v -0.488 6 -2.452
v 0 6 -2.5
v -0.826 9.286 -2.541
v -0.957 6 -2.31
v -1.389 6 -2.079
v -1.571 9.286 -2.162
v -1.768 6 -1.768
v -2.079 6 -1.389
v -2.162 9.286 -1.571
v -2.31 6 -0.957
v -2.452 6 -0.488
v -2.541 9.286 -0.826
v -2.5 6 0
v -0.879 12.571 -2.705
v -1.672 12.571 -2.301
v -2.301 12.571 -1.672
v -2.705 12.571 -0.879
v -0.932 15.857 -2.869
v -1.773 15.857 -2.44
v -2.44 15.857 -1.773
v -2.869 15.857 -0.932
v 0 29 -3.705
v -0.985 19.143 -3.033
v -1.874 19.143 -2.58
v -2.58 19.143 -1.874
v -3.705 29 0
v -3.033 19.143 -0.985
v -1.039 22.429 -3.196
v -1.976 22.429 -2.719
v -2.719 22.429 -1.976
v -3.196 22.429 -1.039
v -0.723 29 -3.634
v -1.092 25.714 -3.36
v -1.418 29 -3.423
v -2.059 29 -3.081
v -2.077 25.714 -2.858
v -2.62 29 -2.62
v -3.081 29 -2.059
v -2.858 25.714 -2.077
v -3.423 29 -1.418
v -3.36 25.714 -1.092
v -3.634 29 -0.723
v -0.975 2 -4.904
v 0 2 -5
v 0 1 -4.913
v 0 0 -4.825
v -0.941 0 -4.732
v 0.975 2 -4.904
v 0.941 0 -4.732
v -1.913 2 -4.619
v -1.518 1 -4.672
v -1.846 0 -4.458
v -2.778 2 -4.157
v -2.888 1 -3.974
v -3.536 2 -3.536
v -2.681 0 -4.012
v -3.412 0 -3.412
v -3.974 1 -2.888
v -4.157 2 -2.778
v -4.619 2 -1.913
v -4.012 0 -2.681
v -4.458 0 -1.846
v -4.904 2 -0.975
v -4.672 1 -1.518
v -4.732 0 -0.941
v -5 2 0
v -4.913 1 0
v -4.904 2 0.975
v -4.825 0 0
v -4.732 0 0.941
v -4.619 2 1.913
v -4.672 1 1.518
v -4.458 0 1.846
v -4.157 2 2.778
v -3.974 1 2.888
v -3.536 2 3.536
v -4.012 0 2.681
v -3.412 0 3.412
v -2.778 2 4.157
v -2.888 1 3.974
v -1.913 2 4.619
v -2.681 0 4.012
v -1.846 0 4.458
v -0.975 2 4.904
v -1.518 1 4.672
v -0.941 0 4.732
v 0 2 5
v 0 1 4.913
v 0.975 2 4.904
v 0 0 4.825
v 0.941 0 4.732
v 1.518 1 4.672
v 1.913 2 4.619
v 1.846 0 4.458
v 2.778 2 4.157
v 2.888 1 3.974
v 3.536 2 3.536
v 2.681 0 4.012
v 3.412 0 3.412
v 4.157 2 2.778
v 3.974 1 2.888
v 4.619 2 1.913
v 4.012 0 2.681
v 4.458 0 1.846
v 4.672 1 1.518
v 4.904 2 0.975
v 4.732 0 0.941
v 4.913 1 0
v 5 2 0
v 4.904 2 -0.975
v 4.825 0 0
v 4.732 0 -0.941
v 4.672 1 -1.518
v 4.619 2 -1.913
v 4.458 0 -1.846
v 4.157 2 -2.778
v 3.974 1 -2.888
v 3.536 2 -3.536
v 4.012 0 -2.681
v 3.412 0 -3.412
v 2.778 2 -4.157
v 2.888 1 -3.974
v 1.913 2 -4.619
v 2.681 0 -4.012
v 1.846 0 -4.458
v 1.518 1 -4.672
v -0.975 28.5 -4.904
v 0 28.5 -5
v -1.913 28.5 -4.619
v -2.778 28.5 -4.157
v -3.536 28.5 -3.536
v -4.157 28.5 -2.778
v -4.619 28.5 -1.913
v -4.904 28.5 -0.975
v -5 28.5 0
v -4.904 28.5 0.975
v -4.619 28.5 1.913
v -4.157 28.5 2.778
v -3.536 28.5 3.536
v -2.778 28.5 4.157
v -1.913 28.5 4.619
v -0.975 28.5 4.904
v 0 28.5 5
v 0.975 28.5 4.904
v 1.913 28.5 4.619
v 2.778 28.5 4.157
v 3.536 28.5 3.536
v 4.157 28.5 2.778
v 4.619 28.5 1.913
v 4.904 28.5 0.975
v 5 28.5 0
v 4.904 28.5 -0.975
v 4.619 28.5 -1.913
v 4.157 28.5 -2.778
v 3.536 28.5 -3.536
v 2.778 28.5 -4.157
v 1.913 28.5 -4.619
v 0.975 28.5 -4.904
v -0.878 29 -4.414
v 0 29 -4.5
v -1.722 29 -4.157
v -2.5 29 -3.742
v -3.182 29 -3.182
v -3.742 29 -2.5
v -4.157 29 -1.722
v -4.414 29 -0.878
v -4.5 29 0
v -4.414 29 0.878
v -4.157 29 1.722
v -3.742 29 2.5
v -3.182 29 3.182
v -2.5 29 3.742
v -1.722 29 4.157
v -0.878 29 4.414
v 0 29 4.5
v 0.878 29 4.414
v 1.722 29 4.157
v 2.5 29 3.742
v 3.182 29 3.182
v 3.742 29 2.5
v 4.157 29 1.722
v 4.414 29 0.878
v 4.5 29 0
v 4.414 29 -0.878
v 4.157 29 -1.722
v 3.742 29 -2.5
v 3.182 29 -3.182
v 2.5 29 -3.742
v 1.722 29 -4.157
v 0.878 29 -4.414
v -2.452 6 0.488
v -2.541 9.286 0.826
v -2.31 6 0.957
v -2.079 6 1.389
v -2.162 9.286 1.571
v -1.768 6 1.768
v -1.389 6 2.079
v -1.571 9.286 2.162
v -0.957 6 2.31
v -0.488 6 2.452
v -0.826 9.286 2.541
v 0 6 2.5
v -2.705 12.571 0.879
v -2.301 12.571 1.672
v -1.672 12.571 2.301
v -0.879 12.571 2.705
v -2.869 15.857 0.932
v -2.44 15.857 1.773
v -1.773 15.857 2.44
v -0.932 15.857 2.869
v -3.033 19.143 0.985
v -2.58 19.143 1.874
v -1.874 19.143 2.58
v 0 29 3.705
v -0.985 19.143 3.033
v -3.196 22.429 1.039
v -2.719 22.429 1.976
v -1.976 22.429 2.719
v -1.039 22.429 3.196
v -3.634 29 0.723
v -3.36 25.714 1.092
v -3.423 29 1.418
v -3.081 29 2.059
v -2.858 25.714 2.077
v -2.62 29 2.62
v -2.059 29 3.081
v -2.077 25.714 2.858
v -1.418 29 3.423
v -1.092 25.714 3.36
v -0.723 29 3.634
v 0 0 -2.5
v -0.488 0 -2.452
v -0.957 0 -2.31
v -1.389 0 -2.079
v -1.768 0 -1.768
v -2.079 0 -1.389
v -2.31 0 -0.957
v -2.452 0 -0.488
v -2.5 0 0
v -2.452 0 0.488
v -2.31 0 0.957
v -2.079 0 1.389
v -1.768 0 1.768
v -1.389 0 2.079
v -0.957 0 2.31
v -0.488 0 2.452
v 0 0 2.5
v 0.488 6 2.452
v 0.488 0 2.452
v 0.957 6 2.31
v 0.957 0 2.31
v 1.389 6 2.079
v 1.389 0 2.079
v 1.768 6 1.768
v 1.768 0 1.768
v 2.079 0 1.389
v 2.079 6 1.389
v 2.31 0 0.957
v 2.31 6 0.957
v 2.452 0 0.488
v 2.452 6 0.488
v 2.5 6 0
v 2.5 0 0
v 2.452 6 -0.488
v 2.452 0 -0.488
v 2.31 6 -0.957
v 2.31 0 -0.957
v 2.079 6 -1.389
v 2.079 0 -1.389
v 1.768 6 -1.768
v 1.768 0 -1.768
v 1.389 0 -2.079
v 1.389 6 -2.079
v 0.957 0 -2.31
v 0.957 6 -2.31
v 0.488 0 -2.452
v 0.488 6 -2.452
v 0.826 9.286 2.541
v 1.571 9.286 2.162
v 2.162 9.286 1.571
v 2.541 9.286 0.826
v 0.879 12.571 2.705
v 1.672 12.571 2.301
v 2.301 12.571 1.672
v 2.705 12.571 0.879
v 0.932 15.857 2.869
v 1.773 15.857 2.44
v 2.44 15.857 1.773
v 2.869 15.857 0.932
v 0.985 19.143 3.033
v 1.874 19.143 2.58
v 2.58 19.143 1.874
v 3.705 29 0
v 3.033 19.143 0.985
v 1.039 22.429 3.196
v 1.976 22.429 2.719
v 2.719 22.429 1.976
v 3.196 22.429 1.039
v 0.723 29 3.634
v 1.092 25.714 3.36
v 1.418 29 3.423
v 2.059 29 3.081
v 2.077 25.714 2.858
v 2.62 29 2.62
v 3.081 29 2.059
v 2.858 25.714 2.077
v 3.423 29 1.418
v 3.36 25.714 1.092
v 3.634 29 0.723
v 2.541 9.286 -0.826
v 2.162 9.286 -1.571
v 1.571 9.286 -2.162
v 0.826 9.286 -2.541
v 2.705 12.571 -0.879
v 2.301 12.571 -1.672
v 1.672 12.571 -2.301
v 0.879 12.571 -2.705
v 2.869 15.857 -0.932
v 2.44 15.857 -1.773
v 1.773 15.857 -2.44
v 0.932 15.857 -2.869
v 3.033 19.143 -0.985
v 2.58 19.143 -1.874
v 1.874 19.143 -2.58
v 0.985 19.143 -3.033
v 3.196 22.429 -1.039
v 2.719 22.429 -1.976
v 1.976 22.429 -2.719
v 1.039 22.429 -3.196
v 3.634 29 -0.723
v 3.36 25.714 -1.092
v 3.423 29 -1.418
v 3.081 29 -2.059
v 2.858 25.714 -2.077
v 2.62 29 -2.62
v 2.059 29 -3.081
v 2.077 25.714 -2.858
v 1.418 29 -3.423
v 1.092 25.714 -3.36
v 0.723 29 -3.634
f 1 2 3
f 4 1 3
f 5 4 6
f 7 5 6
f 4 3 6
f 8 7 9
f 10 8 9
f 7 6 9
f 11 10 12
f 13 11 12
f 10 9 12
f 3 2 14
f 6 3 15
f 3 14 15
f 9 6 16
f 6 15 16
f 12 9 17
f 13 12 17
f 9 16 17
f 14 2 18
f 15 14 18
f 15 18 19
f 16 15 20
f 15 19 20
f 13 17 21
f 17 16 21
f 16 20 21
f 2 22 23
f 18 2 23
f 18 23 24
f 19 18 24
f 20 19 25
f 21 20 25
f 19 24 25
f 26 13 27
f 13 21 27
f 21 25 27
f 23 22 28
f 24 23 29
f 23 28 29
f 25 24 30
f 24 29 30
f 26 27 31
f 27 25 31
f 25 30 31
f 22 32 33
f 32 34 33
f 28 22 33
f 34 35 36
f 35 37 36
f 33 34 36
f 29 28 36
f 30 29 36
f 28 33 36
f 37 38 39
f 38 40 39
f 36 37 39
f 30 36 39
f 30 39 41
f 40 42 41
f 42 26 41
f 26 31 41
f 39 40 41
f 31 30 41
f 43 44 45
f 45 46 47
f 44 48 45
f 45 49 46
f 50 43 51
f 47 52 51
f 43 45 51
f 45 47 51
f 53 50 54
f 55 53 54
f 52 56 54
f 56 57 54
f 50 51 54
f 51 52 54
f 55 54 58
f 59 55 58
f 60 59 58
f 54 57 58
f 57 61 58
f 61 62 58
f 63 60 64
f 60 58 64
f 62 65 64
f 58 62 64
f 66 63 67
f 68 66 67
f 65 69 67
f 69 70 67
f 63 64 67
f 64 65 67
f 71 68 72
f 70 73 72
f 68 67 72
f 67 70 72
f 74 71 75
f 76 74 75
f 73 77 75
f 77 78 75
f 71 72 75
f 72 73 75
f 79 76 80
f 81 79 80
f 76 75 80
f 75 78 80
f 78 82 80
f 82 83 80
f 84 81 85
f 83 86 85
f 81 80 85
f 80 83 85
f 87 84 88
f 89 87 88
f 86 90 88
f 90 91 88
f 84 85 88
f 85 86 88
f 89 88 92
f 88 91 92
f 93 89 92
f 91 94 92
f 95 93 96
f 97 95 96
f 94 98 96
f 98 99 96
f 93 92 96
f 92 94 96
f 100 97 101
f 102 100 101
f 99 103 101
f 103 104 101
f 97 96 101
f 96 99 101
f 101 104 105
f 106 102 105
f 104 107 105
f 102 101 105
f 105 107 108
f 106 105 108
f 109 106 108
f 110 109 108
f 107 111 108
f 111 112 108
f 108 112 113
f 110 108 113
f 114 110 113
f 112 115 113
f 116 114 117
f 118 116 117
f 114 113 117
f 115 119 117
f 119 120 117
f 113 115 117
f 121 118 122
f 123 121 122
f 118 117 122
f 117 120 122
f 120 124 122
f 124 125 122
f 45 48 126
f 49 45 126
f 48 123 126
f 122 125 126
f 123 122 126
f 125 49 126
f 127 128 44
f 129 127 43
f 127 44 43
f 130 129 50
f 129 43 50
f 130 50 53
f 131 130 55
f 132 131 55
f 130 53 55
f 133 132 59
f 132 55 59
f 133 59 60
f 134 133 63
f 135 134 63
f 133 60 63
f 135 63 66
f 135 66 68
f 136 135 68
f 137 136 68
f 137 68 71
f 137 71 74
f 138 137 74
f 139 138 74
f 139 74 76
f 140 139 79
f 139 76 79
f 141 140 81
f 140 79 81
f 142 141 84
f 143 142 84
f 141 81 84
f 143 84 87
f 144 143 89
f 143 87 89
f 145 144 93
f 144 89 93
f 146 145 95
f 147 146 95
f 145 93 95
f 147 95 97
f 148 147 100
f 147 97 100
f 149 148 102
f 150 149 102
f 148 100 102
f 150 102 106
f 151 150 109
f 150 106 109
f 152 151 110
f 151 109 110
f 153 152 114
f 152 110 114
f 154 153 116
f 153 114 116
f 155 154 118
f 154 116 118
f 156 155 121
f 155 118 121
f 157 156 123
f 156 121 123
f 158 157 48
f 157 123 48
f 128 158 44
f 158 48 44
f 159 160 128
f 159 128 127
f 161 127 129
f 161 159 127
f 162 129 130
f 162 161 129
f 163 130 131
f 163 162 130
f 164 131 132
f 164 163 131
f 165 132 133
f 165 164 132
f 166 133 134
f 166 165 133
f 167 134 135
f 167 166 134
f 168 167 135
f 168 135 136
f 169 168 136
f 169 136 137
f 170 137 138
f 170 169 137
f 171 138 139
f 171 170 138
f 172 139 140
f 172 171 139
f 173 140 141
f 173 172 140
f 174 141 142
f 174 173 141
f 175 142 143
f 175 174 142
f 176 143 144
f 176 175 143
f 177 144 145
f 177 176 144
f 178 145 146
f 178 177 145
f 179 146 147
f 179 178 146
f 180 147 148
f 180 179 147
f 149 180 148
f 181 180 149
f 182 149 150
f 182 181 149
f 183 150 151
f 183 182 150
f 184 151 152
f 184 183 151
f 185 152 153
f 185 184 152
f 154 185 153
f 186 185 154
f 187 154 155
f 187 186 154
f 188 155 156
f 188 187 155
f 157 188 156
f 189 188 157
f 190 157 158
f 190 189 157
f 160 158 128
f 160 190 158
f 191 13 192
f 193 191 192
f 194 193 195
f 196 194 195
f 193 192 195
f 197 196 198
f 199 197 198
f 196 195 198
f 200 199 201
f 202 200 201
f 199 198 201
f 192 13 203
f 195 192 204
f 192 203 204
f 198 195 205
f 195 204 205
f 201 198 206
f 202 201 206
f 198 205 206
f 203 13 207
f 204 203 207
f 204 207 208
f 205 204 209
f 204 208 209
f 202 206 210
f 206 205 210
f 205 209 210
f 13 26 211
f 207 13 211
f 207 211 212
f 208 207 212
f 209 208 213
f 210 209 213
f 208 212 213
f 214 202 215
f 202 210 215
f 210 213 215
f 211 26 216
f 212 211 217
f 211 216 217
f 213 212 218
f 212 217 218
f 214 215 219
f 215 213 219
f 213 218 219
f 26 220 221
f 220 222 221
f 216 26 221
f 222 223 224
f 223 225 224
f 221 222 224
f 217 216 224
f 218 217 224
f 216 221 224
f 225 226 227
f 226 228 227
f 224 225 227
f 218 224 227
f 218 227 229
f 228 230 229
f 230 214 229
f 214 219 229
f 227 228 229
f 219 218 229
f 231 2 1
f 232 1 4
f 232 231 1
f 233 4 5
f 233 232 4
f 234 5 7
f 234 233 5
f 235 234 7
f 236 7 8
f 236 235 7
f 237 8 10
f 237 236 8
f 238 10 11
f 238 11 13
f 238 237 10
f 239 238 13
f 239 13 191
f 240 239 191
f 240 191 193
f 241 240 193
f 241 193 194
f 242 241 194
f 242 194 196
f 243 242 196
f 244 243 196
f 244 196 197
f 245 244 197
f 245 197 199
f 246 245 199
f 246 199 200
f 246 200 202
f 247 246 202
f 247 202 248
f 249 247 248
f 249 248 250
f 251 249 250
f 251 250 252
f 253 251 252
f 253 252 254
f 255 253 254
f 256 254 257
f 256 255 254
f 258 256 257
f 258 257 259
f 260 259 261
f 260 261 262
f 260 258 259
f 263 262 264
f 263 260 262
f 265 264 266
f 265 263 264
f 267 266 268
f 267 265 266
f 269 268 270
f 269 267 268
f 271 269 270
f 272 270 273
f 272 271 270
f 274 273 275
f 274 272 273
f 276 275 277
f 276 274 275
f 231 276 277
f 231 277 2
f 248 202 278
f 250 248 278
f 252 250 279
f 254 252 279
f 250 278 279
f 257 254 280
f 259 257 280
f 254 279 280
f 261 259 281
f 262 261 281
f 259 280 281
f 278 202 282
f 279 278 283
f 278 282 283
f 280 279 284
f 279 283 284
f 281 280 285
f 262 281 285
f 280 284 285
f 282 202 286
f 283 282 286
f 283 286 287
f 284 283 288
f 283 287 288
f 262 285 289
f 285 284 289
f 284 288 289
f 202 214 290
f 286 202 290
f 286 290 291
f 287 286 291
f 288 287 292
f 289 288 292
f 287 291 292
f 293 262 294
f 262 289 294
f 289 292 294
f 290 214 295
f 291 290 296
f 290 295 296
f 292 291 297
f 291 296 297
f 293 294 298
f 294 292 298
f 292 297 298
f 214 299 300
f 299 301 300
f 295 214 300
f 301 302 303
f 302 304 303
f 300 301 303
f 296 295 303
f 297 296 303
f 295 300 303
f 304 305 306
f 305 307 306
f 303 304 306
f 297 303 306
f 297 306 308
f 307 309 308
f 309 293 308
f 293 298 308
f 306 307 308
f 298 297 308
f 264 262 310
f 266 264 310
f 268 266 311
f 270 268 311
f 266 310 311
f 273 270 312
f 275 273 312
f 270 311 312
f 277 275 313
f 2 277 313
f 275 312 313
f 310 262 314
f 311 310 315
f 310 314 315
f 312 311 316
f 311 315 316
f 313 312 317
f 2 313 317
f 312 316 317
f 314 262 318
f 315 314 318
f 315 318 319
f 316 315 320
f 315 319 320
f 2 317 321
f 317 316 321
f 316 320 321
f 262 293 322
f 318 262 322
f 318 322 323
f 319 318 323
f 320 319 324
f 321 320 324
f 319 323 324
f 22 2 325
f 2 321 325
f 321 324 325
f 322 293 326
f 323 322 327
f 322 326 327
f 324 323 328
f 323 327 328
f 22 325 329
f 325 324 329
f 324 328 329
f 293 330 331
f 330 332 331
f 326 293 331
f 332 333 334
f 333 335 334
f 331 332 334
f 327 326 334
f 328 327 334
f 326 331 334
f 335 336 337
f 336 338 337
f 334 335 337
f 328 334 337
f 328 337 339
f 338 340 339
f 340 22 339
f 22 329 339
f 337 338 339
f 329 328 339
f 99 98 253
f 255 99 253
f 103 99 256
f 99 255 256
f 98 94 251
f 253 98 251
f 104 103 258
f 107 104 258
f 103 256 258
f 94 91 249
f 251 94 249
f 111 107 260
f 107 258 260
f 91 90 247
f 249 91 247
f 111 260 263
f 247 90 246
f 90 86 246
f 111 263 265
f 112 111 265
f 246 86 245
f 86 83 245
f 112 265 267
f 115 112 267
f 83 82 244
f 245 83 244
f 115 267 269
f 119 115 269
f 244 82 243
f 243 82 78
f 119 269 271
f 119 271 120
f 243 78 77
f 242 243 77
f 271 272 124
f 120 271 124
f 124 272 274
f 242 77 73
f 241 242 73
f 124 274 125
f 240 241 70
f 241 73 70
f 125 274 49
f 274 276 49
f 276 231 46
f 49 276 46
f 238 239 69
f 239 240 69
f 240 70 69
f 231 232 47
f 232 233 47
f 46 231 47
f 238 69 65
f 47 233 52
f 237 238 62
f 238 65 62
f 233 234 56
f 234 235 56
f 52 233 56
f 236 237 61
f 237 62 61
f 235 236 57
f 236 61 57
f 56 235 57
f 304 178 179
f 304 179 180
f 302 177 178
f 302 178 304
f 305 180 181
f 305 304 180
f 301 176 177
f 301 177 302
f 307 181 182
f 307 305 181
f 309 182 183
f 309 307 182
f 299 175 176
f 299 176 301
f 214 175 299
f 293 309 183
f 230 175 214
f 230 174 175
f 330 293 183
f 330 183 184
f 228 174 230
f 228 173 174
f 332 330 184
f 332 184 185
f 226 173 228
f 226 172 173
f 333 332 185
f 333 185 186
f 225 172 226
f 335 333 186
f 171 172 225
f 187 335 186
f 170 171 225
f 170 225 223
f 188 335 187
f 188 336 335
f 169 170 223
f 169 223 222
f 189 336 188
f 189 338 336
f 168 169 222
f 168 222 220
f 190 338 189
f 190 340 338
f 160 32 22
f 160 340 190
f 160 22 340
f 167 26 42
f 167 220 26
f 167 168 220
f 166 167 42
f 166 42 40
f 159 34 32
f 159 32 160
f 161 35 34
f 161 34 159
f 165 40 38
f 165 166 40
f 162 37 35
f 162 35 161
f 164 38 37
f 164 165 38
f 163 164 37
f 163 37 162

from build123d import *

# Parameters (mm, degrees)
SKETCH1_R           = 5
SKETCH1_R_2         = 2.5
BOSS_EXTRUDE1_DEPTH = 29
CHAMFER1_SIZE       = 2
CHAMFER1_SIZE2      = 0.174977327
CHAMFER2_SIZE       = 0.5


with BuildPart() as part:
    # Sketch1 → Boss-Extrude1 (new body)
    with BuildSketch(Plane(origin=(0, 0, 0), x_dir=(1, 0, 0), z_dir=(0, 1, 0))):
        with Locations(Location((0, 0, 0), (0, 0, 90))):
            Circle(SKETCH1_R)
        with Locations(Location((0, 0, 0), (0, 0, 90))):
            Circle(SKETCH1_R_2, mode=Mode.SUBTRACT)
    extrude(amount=BOSS_EXTRUDE1_DEPTH)

    # Cut-Sweep1: sweep along a curve in space
    with BuildLine() as cut_sweep1_path:
        ThreePointArc((0, 29, 2.5), (1.767766953, 29, 1.767766953), (2.5, 29, 0))
        ThreePointArc((2.5, 29, 0), (1.767766953, 29, -1.767766953), (0, 29, -2.5))
        ThreePointArc((0, 29, -2.5), (-1.767766953, 29, -1.767766953), (-2.5, 29, 0))
        ThreePointArc((-2.5, 29, 0), (-1.767766953, 29, 1.767766953), (0, 29, 2.5))
    # Sketch2 → Cut-Sweep1 (sweep, cut)
    with BuildSketch(Plane.XY):
        Polygon((2.5, 6), (3.705378924, 29), (2.5, 29), align=None)
    sweep(path=cut_sweep1_path.line, mode=Mode.SUBTRACT)

    # Chamfer1
    chamfer1_edges = [part.edges().sort_by_distance(p)[0] for p in [
        (0, 0, 5),
    ]]
    chamfer1_side = [part.faces().sort_by_distance(p)[0] for p in [
        (0, 14.5, 5),
    ]]
    chamfer(chamfer1_edges, length=CHAMFER1_SIZE, length2=CHAMFER1_SIZE2, reference=chamfer1_side[0])

    # Chamfer2
    chamfer2_edges = [part.edges().sort_by_distance(p)[0] for p in [
        (0, 29, 5),
    ]]
    chamfer(chamfer2_edges, length=CHAMFER2_SIZE)


solid = part.part
